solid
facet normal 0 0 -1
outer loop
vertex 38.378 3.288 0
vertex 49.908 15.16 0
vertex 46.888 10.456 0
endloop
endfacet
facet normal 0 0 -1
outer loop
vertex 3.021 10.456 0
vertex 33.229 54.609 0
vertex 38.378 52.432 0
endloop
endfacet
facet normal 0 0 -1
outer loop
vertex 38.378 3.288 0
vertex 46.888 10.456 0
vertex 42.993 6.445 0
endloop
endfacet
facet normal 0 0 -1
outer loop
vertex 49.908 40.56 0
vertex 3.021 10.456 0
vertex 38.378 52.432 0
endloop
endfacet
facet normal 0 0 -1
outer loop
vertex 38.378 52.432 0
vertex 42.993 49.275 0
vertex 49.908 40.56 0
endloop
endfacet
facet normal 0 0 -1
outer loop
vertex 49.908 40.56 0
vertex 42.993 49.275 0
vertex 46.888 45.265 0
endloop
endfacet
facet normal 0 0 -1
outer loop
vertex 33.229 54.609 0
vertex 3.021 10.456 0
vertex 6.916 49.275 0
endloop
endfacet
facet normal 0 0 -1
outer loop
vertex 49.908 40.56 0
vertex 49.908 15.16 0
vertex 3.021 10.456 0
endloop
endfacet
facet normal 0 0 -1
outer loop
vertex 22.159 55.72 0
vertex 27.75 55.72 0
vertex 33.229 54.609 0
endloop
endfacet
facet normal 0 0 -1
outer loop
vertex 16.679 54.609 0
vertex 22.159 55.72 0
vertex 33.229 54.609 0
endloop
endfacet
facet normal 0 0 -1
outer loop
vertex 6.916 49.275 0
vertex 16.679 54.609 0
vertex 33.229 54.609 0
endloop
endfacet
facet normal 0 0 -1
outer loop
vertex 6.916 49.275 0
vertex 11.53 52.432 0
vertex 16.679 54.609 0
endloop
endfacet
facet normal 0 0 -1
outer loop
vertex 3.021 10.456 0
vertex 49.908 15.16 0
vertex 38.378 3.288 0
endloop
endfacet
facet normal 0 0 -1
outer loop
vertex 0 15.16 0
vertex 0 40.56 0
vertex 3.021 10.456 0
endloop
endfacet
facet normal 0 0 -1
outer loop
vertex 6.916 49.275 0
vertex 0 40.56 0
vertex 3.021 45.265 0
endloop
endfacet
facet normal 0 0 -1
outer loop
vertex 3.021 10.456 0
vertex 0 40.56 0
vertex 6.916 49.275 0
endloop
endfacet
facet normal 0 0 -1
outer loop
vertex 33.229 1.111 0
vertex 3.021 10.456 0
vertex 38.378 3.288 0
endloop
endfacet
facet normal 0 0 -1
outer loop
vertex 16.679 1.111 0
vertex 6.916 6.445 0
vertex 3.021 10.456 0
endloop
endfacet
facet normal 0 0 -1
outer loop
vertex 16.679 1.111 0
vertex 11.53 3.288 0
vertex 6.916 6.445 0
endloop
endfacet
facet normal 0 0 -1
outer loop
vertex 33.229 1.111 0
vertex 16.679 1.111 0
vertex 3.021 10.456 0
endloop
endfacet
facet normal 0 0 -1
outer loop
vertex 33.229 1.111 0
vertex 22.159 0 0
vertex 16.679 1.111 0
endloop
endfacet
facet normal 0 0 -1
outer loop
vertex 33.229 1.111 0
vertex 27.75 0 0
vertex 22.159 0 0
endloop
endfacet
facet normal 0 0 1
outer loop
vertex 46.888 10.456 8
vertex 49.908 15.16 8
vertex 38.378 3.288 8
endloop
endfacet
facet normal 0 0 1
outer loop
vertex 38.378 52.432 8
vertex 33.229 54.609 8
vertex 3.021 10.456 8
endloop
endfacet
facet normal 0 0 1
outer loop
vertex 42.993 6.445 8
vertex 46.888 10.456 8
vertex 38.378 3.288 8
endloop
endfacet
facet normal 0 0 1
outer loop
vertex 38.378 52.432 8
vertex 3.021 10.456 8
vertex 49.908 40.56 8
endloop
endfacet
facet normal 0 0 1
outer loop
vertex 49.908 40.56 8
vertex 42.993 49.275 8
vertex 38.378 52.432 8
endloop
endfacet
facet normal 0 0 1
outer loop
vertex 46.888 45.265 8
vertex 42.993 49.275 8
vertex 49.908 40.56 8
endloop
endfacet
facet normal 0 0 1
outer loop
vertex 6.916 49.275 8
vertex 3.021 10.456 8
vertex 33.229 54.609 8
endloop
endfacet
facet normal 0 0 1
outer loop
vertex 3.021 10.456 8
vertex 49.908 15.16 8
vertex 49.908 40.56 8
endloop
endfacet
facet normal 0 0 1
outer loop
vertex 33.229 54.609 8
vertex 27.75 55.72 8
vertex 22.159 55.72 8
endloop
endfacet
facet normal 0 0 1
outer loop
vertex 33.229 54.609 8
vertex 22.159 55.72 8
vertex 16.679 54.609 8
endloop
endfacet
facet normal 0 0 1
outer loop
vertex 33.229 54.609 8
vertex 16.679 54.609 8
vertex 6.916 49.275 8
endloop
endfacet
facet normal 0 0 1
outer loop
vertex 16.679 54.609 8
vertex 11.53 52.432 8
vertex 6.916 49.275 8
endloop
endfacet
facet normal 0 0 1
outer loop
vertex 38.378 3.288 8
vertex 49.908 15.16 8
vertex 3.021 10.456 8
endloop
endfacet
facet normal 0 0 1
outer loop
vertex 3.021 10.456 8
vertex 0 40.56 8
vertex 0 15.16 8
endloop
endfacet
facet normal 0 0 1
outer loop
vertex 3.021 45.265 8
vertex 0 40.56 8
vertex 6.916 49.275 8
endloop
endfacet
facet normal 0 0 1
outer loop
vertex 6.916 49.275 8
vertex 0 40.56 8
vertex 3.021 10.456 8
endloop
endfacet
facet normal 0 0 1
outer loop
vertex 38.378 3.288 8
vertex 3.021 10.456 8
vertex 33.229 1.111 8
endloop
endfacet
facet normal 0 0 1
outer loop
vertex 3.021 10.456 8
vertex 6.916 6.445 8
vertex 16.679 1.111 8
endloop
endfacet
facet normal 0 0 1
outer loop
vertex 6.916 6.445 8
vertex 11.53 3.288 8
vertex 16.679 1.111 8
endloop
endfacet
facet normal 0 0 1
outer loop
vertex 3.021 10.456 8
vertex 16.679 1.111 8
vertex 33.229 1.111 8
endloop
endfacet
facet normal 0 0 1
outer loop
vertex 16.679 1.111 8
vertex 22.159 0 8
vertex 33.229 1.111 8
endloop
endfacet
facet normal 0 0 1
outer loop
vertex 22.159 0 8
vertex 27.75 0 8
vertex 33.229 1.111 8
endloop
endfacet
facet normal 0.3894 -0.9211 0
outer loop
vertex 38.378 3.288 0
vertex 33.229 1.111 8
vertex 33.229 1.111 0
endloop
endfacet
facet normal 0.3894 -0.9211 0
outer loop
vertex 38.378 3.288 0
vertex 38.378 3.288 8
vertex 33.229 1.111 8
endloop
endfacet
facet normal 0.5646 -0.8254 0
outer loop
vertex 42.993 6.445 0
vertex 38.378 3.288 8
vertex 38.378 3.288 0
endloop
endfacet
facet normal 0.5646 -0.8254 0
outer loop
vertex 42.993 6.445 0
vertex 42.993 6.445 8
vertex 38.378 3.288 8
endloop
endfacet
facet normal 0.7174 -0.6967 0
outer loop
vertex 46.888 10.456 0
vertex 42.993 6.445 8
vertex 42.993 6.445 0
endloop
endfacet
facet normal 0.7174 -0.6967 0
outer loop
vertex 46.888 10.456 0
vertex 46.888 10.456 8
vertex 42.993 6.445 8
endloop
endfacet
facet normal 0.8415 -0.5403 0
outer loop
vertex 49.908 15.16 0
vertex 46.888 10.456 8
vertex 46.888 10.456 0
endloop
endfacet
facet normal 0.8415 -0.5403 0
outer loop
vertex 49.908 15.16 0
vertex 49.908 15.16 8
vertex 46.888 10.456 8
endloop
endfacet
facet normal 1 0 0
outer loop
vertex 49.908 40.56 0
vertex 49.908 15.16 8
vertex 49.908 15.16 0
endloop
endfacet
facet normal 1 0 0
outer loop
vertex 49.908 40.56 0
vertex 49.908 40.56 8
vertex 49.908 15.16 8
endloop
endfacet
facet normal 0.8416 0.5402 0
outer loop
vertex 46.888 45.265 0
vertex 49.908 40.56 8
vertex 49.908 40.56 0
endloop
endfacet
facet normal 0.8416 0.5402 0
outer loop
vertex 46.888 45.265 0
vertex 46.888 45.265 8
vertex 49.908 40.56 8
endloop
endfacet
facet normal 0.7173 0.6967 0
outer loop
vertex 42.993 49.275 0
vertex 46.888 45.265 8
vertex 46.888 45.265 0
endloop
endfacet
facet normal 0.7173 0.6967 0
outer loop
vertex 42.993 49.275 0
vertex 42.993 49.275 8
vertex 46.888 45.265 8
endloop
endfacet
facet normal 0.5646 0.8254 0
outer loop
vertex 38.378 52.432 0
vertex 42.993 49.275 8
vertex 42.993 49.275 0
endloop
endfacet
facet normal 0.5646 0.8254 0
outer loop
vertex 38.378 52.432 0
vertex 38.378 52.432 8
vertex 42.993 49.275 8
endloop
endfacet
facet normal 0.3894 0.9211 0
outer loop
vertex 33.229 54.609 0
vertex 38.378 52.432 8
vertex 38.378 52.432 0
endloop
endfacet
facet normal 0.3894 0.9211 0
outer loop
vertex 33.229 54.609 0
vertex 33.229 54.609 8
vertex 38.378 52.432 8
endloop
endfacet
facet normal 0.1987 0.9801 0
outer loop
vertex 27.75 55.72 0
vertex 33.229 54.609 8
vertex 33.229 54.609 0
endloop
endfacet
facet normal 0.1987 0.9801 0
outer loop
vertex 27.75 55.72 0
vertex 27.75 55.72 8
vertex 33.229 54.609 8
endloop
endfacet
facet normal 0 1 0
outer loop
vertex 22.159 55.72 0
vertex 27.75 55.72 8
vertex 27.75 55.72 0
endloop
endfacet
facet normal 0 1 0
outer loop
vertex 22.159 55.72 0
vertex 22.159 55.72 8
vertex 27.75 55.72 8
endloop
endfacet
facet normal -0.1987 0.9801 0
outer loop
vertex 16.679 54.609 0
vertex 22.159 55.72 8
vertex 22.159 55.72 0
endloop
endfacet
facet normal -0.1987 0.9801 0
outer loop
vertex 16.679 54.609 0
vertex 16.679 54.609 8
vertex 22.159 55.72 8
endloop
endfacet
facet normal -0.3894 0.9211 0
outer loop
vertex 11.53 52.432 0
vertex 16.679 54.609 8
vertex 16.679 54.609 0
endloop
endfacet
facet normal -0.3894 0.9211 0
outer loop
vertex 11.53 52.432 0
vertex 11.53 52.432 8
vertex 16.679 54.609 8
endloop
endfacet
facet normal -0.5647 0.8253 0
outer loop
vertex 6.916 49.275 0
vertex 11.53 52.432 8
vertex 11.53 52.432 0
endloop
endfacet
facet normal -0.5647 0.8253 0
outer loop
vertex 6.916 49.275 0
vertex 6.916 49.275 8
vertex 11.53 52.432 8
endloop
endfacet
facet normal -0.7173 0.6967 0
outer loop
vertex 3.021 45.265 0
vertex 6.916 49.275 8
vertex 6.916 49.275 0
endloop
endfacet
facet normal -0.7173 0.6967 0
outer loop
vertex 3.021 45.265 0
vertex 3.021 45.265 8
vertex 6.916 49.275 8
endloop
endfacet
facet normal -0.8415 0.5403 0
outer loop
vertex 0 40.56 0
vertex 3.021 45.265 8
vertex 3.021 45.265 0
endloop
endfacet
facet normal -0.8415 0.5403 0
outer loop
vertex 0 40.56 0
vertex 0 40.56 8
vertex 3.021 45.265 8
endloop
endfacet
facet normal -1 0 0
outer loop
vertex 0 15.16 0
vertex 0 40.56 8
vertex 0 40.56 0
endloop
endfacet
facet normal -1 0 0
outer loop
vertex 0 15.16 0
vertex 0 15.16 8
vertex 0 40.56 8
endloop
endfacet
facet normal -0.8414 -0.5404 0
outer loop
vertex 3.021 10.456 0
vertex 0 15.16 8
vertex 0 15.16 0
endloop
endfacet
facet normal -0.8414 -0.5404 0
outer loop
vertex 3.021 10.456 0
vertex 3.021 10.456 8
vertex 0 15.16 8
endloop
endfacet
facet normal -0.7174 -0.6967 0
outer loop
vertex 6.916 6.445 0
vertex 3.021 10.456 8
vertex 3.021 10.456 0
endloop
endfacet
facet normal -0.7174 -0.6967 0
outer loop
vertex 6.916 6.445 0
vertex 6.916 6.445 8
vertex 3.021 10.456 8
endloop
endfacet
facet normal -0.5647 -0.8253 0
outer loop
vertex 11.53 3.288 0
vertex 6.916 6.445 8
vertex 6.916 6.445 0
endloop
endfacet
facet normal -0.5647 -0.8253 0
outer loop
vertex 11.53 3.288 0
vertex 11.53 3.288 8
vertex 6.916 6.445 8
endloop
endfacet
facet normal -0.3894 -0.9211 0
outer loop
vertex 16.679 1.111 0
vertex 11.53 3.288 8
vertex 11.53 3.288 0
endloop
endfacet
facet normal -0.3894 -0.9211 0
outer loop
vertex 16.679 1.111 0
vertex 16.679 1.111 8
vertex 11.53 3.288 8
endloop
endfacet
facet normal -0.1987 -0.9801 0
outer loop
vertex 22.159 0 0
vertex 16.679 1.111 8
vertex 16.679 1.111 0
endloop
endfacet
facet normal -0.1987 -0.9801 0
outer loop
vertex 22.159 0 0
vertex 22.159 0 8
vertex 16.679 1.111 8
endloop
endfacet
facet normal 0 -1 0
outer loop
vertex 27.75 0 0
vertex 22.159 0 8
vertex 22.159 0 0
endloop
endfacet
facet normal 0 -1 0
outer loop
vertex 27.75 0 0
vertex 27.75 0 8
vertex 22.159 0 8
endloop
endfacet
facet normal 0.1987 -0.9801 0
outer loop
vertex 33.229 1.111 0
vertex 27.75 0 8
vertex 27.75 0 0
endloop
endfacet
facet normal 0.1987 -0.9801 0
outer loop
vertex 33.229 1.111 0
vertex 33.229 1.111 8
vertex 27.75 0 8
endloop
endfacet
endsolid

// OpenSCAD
$fn = 32;

// ----------------------------------------------------------------------
// Flat adaptor: double_d, 8 mm thick
// ----------------------------------------------------------------------

// --- parameters (mm) ---
profile_height = 8;       // extrusion height
profile_points = 24;      // points of the closed outline

profile = [[49.908, 40.56], [46.888, 45.265], [42.993, 49.275], [38.378, 52.432], [33.229, 54.609], [27.75, 55.72], [22.159, 55.72], [16.679, 54.609], [11.53, 52.432], [6.916, 49.275], [3.021, 45.265], [0, 40.56], [0, 15.16], [3.021, 10.456], [6.916, 6.445], [11.53, 3.288], [16.679, 1.111], [22.159, 0], [27.75, 0], [33.229, 1.111], [38.378, 3.288], [42.993, 6.445], [46.888, 10.456], [49.908, 15.16]];  // single closed polygon, 24 points, counter clockwise

// --- the one profile operation ---
linear_extrude(height = profile_height) polygon(points = profile);
